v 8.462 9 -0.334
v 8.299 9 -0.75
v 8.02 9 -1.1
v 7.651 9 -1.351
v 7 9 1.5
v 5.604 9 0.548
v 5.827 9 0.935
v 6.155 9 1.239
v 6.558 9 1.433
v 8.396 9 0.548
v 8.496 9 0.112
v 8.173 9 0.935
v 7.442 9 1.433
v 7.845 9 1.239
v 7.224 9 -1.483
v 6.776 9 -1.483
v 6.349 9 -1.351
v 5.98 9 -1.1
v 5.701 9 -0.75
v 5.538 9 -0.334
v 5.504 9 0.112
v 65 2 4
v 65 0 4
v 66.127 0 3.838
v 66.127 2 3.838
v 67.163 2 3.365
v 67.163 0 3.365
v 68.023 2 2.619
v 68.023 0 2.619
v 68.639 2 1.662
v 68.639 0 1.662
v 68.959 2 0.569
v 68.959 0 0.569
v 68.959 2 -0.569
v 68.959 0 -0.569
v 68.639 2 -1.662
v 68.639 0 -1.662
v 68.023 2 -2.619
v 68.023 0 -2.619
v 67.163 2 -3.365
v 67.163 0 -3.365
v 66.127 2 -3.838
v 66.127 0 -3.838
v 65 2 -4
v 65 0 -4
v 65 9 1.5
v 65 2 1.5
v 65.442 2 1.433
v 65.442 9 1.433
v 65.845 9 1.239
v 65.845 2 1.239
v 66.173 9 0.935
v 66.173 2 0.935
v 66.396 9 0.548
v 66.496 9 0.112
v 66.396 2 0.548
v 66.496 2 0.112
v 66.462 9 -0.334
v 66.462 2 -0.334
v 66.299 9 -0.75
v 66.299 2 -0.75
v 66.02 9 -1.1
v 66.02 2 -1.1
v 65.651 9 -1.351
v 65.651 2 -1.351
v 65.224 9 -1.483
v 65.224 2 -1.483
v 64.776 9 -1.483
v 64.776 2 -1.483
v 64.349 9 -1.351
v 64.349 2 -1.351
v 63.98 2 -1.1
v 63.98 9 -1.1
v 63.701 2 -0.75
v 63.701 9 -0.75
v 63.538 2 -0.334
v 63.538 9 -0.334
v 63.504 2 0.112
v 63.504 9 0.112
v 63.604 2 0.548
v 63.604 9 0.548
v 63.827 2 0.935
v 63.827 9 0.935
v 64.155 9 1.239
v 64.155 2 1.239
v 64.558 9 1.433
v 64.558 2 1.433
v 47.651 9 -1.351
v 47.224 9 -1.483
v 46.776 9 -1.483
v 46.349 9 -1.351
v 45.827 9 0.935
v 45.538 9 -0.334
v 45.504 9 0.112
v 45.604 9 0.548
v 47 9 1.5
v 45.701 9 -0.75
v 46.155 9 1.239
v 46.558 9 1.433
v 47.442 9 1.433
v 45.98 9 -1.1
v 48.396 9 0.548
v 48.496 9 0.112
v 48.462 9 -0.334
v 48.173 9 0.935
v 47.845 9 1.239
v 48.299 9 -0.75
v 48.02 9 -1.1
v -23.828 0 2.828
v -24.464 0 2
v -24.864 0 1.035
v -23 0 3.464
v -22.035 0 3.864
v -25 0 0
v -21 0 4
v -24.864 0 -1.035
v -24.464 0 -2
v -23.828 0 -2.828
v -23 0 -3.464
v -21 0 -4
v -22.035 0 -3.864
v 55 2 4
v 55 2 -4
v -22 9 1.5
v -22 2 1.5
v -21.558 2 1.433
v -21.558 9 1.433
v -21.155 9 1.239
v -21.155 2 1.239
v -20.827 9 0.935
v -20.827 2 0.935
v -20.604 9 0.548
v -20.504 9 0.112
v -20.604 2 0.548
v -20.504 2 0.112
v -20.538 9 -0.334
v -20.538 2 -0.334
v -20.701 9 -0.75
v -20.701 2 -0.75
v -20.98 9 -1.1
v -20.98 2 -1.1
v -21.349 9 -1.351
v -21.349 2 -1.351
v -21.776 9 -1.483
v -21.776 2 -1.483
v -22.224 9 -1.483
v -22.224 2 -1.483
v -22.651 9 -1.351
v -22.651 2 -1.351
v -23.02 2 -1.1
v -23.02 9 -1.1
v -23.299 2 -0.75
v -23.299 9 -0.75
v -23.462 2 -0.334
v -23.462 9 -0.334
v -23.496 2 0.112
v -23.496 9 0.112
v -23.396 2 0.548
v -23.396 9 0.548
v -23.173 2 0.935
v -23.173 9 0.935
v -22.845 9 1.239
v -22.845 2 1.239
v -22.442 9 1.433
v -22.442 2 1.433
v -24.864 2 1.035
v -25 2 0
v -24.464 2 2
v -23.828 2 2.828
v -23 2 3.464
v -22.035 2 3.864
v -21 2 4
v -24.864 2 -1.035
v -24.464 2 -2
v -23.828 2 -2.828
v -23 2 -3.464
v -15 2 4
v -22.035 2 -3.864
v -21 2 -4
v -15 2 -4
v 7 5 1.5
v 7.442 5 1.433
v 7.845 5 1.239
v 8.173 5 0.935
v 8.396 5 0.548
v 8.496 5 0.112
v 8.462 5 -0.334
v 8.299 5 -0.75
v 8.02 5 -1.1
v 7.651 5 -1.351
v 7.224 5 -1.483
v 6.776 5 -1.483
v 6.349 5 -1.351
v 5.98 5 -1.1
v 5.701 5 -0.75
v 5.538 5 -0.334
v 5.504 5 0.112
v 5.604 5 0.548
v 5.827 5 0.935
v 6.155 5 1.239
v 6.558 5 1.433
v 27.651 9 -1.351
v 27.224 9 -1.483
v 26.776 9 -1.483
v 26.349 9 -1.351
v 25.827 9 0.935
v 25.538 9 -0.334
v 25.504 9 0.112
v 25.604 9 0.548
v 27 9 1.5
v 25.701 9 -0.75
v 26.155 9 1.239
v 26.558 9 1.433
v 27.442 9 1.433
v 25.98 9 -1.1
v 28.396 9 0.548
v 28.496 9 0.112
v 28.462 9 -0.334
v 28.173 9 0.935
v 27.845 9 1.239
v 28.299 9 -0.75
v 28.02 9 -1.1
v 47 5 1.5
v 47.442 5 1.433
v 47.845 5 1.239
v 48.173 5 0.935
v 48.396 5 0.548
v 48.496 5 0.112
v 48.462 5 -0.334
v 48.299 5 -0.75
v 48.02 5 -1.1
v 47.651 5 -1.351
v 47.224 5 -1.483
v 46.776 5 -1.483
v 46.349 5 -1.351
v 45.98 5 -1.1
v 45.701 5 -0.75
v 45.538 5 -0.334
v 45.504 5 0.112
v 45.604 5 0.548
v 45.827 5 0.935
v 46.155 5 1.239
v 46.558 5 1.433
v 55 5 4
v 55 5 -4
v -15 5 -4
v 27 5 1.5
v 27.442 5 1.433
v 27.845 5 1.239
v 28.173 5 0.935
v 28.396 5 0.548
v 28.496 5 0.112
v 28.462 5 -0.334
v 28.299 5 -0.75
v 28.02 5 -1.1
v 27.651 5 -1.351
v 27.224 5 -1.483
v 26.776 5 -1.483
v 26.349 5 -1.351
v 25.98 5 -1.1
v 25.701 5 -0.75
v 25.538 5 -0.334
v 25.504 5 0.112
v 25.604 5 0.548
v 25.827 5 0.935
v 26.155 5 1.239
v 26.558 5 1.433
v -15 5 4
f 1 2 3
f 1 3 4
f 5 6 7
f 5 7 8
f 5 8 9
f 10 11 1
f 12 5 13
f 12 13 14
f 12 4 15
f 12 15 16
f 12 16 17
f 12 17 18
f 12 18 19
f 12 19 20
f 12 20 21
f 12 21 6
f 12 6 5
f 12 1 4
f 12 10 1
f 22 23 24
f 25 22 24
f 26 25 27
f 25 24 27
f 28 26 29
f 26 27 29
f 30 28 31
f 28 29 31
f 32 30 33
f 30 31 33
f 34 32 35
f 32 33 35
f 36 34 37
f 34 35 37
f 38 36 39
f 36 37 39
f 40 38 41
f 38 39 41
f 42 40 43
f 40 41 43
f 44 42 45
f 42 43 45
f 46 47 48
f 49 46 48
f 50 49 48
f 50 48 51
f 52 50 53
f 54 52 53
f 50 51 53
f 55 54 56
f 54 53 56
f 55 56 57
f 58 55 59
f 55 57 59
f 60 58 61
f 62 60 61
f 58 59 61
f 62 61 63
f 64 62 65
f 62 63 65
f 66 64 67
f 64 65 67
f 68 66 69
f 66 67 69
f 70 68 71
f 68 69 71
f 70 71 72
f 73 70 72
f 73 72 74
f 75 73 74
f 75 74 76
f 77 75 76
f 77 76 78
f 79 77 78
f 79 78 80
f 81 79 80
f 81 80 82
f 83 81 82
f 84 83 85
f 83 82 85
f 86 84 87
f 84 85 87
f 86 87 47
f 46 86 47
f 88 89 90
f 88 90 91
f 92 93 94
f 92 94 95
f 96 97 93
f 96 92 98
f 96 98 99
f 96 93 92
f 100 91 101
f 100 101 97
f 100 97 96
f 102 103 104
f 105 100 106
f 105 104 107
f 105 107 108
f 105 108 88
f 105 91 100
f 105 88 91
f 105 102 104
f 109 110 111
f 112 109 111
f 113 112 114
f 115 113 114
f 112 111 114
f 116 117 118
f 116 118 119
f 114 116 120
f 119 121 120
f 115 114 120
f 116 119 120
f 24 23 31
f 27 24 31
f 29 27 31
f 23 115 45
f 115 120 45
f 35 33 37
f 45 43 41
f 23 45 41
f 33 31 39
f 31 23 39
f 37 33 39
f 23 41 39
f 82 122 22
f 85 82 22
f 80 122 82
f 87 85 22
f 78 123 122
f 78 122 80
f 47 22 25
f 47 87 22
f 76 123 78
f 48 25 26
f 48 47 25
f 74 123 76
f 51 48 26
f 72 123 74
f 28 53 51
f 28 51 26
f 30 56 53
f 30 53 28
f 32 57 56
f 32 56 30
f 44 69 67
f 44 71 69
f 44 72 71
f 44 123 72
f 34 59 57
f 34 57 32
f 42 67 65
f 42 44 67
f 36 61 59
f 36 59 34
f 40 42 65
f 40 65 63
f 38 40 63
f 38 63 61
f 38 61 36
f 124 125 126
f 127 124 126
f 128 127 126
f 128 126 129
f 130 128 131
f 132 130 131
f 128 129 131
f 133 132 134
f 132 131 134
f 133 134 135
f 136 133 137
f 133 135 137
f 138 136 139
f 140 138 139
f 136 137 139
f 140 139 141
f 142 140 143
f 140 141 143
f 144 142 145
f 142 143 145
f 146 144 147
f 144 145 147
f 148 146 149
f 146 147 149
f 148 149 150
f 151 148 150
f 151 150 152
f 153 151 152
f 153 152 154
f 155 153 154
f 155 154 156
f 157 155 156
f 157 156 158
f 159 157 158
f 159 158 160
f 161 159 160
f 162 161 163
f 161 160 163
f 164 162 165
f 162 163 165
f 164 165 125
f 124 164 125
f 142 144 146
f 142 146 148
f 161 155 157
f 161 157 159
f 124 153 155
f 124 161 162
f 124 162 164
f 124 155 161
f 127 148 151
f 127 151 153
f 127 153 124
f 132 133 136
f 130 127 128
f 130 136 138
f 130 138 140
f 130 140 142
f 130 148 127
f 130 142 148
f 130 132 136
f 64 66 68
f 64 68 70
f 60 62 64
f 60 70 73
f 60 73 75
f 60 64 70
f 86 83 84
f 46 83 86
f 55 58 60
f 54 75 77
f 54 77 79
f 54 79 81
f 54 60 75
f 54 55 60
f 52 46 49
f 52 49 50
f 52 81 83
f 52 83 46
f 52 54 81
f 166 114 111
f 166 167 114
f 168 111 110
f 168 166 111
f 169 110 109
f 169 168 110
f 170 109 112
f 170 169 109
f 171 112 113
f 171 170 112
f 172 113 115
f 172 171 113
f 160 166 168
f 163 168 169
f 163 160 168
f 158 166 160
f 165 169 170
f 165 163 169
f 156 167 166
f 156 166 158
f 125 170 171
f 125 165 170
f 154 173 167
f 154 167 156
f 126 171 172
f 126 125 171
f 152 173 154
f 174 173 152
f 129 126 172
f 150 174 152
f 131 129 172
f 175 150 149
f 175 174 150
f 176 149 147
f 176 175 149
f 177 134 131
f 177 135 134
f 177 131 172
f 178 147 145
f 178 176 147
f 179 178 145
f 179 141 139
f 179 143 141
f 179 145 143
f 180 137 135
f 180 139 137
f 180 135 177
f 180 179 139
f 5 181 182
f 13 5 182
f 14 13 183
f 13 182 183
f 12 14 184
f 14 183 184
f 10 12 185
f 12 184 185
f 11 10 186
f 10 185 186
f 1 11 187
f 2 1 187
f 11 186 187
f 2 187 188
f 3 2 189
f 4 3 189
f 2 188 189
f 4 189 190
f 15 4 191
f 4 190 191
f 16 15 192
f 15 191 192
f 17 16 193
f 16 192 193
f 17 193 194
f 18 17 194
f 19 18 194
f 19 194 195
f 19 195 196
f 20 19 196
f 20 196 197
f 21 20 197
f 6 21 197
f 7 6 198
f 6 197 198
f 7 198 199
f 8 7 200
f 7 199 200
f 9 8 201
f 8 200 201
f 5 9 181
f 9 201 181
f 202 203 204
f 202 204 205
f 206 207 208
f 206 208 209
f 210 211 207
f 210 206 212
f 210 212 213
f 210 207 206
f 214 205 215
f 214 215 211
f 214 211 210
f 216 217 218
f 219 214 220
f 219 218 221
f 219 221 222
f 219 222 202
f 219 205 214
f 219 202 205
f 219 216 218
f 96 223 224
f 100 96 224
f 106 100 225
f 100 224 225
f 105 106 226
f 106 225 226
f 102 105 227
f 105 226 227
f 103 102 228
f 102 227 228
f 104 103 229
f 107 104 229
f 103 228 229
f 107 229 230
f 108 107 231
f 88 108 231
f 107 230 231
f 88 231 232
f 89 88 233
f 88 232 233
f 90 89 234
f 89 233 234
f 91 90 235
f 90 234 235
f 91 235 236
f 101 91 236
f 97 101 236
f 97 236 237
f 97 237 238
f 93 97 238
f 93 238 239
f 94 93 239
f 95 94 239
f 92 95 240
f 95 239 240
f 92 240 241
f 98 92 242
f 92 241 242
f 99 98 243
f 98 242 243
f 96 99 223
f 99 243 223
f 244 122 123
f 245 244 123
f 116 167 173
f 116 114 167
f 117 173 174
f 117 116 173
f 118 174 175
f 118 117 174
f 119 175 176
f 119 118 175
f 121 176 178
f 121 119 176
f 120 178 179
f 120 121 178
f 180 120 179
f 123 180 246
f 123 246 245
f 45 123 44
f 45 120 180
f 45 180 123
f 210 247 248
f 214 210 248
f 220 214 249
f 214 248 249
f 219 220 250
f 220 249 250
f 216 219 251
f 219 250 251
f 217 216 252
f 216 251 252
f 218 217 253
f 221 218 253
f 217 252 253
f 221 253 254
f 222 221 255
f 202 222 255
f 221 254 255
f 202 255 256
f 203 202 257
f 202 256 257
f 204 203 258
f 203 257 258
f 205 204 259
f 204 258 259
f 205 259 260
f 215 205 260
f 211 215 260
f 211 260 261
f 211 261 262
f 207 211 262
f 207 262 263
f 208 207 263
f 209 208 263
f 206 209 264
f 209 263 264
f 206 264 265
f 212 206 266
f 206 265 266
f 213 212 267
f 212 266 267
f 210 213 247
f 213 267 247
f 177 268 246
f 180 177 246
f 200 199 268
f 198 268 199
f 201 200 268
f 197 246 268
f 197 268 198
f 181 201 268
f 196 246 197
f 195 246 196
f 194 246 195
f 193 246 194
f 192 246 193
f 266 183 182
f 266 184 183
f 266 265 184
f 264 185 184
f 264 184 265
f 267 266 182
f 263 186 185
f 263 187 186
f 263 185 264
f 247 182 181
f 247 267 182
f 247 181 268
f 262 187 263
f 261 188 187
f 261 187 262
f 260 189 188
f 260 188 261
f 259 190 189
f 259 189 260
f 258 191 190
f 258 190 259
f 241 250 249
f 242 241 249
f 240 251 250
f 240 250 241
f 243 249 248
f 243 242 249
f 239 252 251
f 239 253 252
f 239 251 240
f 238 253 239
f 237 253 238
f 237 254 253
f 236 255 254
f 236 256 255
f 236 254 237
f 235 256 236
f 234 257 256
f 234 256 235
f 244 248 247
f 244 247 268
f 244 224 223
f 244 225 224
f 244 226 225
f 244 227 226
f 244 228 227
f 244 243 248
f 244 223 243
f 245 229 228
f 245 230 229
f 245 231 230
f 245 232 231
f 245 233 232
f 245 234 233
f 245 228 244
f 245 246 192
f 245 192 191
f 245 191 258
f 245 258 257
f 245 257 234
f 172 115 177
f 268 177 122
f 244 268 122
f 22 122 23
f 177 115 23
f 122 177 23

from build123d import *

# Parameters (mm, degrees)
BOSS_EXTRUDE2_DEPTH = 2
SKETCH3_W           = 80
SKETCH3_H           = 8
BOSS_EXTRUDE3_DEPTH = 3
SKETCH4_R           = 1.5
BOSS_EXTRUDE4_DEPTH = 7
SKETCH12_R          = 1.5
BOSS_EXTRUDE6_DEPTH = 4
SKETCH14_W          = 10
SKETCH14_H          = 8
CUT_EXTRUDE1_DEPTH  = 3
SKETCH15_R          = 1.5
BOSS_EXTRUDE7_DEPTH = 7
FILLET1_R           = 4


with BuildPart() as part:
    # Sketch1 → Boss-Extrude2 (new body)
    with BuildSketch(Plane(origin=(0, 0, 0), x_dir=(1, 0, 0), z_dir=(0, 1, 0))):
        with BuildLine():
            Line((-25, -4), (65, -4))
            ThreePointArc((65, -4), (69, 0), (65, 4))
            Line((65, 4), (-25, 4))
            Line((-25, 4), (-25, -4))
        make_face()
    extrude(amount=BOSS_EXTRUDE2_DEPTH)

    # Sketch3 → Boss-Extrude3 (add)
    with BuildSketch(Plane(origin=(0, 2, 0), x_dir=(1, 0, 0), z_dir=(0, 1, 0))):
        with Locations((15, 0)):
            Rectangle(SKETCH3_W, SKETCH3_H)
    extrude(amount=BOSS_EXTRUDE3_DEPTH)

    # Sketch4 → Boss-Extrude4 (add)
    with BuildSketch(Plane(origin=(0, 2, 0), x_dir=(1, 0, 0), z_dir=(0, 1, 0))):
        with Locations(Location((65, 0, 0), (0, 0, 270))):
            Circle(SKETCH4_R)
    extrude(amount=BOSS_EXTRUDE4_DEPTH)

    # Sketch12 → Boss-Extrude6 (add)
    with BuildSketch(Plane(origin=(0, 5, 0), x_dir=(1, 0, 0), z_dir=(0, 1, 0))):
        with Locations(Location((47, 0, 0), (0, 0, 270))):
            Circle(SKETCH12_R)
        with Locations(Location((27, 0, 0), (0, 0, 270))):
            Circle(SKETCH12_R)
        with Locations(Location((7, 0, 0), (0, 0, 270))):
            Circle(SKETCH12_R)
    extrude(amount=BOSS_EXTRUDE6_DEPTH)

    # Sketch14 → Cut-Extrude1 (cut)
    with BuildSketch(Plane(origin=(0, 5, 0), x_dir=(1, 0, 0), z_dir=(0, 1, 0))):
        with Locations((-20, 0)):
            Rectangle(SKETCH14_W, SKETCH14_H)
    extrude(amount=-CUT_EXTRUDE1_DEPTH, mode=Mode.SUBTRACT)

    # Sketch15 → Boss-Extrude7 (add)
    with BuildSketch(Plane(origin=(0, 2, 0), x_dir=(1, 0, 0), z_dir=(0, 1, 0))):
        with Locations(Location((-22, 0, 0), (0, 0, 270))):
            Circle(SKETCH15_R)
    extrude(amount=BOSS_EXTRUDE7_DEPTH)

    # Fillet1
    fillet1_edges = [part.edges().sort_by_distance(p)[0] for p in [
        (-25, 1, -4),
        (-25, 1, 4),
    ]]
    fillet(fillet1_edges, radius=FILLET1_R - 0.0001)  # a hair under: the kernel refuses the full size


solid = part.part
